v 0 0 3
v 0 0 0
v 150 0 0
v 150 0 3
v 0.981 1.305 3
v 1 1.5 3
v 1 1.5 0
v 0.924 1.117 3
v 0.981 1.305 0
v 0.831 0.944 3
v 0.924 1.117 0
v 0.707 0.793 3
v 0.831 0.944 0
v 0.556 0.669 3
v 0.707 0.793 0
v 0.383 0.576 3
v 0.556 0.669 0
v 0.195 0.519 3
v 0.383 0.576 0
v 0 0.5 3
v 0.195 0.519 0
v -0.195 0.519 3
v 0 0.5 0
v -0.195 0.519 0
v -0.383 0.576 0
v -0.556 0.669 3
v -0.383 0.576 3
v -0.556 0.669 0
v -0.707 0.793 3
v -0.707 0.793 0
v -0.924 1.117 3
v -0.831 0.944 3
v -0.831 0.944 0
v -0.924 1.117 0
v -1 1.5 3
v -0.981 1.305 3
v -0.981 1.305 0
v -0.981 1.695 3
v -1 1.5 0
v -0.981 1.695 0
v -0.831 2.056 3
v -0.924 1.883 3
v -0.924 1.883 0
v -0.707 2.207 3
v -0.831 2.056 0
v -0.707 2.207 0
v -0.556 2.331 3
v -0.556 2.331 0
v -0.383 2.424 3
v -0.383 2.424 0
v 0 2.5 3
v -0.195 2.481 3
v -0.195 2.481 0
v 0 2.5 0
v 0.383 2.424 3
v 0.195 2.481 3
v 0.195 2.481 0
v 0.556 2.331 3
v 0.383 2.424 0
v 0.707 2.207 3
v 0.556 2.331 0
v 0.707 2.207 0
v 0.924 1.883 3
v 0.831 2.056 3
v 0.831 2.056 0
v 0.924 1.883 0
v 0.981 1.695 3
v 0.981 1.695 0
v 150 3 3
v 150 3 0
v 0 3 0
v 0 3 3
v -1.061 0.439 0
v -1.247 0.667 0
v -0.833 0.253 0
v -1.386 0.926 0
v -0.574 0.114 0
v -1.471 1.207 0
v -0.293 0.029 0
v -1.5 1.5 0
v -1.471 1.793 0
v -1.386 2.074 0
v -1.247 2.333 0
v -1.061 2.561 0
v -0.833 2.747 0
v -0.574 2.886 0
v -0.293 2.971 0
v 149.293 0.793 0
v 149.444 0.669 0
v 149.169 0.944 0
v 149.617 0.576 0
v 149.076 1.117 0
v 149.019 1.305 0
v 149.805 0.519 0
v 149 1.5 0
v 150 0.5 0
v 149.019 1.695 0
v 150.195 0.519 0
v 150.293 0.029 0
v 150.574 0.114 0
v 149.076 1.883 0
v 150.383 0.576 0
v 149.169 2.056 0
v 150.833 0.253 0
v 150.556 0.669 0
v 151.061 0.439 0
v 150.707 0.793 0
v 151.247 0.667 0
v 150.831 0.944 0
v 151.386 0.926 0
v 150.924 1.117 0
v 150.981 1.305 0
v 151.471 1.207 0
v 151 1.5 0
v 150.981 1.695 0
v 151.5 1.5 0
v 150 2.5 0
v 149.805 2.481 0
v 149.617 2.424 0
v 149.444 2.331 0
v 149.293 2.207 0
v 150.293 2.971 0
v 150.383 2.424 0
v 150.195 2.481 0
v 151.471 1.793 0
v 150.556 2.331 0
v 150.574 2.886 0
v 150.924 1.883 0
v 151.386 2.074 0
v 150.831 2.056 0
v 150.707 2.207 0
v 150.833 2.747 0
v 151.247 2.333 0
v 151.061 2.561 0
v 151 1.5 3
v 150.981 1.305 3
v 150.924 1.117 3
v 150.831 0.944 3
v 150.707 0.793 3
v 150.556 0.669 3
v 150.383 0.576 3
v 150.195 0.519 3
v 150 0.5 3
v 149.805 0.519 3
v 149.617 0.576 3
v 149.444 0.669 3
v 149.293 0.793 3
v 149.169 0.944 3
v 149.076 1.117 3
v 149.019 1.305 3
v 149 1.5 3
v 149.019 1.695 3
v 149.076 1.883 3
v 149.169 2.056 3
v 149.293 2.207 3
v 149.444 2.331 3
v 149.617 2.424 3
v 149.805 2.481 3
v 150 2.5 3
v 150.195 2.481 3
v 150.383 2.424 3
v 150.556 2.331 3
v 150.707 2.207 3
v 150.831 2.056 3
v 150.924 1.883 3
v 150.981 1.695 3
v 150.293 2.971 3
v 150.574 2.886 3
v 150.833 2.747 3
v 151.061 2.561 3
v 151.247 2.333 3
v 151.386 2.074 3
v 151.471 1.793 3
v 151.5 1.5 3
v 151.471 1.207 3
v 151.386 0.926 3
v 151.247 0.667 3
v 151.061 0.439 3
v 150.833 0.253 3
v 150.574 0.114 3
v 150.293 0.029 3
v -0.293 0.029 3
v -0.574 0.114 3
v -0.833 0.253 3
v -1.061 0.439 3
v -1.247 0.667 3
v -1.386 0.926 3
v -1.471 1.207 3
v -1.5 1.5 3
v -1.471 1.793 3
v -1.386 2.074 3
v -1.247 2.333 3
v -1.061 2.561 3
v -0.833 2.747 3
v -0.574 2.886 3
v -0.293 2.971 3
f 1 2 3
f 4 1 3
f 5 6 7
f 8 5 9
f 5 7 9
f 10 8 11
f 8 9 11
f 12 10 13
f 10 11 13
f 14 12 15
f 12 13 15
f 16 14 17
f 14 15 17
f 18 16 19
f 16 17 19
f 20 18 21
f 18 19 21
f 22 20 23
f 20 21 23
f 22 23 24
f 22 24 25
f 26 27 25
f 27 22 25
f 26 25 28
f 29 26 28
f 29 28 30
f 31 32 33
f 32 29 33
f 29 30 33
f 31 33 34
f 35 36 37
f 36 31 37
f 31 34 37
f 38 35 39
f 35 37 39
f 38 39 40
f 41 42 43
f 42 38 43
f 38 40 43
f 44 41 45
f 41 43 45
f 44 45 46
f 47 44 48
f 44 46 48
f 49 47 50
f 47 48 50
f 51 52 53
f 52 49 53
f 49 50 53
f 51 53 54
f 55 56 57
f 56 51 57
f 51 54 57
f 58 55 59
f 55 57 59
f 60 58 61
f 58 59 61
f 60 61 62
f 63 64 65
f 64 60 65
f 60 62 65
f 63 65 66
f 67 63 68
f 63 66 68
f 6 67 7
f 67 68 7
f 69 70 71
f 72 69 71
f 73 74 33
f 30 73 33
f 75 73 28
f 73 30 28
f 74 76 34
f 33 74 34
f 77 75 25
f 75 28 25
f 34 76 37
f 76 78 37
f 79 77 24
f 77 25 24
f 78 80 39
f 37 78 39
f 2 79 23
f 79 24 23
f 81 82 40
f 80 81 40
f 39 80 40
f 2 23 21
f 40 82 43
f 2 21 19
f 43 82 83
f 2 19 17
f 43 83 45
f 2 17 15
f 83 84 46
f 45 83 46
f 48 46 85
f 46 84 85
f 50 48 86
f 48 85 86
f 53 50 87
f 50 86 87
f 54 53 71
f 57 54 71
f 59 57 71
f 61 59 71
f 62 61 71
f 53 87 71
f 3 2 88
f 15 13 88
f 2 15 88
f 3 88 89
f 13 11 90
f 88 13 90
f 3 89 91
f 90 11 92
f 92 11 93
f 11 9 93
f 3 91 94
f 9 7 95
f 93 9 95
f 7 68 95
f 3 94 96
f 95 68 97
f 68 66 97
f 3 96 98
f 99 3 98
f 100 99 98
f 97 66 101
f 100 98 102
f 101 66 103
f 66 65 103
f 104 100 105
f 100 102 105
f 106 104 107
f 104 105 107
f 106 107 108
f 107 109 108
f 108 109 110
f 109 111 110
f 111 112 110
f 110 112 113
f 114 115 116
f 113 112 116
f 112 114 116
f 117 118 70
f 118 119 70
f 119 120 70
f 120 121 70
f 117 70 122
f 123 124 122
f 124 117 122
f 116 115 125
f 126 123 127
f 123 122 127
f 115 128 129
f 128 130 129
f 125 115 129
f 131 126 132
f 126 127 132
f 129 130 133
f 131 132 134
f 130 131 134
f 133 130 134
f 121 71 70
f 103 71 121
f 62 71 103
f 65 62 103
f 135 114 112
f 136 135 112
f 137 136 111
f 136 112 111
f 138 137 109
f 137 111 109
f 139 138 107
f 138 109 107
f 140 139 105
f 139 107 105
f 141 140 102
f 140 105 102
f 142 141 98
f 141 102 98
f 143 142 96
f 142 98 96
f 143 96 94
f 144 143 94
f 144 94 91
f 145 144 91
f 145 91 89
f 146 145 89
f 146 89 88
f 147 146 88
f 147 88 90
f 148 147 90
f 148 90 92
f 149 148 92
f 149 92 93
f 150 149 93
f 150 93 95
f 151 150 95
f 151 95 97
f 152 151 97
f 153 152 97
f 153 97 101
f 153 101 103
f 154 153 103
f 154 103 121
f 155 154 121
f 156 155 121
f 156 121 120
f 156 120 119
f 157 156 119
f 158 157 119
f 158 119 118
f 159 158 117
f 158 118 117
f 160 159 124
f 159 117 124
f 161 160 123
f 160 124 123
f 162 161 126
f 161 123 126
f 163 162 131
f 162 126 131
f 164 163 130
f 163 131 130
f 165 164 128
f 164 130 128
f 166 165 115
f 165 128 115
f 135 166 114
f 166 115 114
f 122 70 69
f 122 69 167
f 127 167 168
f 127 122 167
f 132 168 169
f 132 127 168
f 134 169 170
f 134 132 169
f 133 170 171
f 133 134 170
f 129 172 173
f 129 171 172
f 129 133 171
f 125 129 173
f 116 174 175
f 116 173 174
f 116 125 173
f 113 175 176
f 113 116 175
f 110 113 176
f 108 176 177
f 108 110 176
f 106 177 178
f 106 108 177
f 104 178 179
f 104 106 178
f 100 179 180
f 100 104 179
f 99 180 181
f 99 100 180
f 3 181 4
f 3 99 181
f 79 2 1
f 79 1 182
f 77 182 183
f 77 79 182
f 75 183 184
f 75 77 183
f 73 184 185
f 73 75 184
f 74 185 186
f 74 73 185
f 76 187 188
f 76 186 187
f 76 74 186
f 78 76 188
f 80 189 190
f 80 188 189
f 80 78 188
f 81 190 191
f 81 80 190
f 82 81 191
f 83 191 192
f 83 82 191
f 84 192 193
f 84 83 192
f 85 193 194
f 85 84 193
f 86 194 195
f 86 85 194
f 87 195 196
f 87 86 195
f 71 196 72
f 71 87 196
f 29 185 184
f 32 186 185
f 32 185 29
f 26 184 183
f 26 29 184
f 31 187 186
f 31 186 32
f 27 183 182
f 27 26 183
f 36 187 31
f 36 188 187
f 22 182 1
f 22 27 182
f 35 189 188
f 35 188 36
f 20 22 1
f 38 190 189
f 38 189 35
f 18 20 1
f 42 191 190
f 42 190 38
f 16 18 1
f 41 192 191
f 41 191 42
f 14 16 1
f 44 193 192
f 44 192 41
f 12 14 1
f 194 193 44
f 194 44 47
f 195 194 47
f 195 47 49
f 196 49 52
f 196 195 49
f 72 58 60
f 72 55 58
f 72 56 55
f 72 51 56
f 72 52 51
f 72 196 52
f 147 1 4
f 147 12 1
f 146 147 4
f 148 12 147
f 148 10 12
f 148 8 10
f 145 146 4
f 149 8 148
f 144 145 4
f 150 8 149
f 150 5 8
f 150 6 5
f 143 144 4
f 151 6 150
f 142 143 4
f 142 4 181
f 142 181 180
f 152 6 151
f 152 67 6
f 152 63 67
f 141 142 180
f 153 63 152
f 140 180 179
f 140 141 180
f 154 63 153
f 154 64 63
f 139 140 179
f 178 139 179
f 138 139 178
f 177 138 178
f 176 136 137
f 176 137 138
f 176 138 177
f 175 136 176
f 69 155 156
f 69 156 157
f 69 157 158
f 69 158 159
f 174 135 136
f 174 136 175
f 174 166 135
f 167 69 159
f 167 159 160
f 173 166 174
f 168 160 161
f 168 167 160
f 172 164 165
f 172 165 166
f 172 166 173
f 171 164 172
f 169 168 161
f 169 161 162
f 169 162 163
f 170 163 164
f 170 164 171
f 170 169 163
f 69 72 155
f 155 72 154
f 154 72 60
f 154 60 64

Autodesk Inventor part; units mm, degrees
ref_plane "YZ Plane" through (0, 0, 0) normal (1, 0, 0) x (0, 1, 0)
ref_plane "XZ Plane" through (0, 0, 0) normal (0, 1, 0) x (-1, 0, 0)
ref_plane "XY Plane" through (0, 0, 0) normal (0, 0, 1) x (1, 0, 0)
sketch "Sketch1" plane through (0, 0, 0) normal (0, 0, 1) x (1, 0, 0)
  line L0 (0, 0) -> (150, 0)
  line L1 (150, 3) -> (0, 3)
  arc A0 (0, 3) -> (0, 0) centre (0, 1.5) ccw
  arc A1 (150, 0) -> (150, 3) centre (150, 1.5) ccw
  circle A2 centre (0, 1.5) radius 1
  circle A3 centre (150, 1.5) radius 1
  line L2 (0, 3) -> (0, 0)
  line L3 (150, 3) -> (150, 0)
  dimension "d2" = 2
  dimension "d3" = 2
  dimension "d9" = 150
extrude "Extrusion1" add sketch "Sketch1" along normal blind 3 contours L2 A2 L1 L3 A3 L0 | A0 L2 A2 | L3 A3 A1
properties part number "L1"
